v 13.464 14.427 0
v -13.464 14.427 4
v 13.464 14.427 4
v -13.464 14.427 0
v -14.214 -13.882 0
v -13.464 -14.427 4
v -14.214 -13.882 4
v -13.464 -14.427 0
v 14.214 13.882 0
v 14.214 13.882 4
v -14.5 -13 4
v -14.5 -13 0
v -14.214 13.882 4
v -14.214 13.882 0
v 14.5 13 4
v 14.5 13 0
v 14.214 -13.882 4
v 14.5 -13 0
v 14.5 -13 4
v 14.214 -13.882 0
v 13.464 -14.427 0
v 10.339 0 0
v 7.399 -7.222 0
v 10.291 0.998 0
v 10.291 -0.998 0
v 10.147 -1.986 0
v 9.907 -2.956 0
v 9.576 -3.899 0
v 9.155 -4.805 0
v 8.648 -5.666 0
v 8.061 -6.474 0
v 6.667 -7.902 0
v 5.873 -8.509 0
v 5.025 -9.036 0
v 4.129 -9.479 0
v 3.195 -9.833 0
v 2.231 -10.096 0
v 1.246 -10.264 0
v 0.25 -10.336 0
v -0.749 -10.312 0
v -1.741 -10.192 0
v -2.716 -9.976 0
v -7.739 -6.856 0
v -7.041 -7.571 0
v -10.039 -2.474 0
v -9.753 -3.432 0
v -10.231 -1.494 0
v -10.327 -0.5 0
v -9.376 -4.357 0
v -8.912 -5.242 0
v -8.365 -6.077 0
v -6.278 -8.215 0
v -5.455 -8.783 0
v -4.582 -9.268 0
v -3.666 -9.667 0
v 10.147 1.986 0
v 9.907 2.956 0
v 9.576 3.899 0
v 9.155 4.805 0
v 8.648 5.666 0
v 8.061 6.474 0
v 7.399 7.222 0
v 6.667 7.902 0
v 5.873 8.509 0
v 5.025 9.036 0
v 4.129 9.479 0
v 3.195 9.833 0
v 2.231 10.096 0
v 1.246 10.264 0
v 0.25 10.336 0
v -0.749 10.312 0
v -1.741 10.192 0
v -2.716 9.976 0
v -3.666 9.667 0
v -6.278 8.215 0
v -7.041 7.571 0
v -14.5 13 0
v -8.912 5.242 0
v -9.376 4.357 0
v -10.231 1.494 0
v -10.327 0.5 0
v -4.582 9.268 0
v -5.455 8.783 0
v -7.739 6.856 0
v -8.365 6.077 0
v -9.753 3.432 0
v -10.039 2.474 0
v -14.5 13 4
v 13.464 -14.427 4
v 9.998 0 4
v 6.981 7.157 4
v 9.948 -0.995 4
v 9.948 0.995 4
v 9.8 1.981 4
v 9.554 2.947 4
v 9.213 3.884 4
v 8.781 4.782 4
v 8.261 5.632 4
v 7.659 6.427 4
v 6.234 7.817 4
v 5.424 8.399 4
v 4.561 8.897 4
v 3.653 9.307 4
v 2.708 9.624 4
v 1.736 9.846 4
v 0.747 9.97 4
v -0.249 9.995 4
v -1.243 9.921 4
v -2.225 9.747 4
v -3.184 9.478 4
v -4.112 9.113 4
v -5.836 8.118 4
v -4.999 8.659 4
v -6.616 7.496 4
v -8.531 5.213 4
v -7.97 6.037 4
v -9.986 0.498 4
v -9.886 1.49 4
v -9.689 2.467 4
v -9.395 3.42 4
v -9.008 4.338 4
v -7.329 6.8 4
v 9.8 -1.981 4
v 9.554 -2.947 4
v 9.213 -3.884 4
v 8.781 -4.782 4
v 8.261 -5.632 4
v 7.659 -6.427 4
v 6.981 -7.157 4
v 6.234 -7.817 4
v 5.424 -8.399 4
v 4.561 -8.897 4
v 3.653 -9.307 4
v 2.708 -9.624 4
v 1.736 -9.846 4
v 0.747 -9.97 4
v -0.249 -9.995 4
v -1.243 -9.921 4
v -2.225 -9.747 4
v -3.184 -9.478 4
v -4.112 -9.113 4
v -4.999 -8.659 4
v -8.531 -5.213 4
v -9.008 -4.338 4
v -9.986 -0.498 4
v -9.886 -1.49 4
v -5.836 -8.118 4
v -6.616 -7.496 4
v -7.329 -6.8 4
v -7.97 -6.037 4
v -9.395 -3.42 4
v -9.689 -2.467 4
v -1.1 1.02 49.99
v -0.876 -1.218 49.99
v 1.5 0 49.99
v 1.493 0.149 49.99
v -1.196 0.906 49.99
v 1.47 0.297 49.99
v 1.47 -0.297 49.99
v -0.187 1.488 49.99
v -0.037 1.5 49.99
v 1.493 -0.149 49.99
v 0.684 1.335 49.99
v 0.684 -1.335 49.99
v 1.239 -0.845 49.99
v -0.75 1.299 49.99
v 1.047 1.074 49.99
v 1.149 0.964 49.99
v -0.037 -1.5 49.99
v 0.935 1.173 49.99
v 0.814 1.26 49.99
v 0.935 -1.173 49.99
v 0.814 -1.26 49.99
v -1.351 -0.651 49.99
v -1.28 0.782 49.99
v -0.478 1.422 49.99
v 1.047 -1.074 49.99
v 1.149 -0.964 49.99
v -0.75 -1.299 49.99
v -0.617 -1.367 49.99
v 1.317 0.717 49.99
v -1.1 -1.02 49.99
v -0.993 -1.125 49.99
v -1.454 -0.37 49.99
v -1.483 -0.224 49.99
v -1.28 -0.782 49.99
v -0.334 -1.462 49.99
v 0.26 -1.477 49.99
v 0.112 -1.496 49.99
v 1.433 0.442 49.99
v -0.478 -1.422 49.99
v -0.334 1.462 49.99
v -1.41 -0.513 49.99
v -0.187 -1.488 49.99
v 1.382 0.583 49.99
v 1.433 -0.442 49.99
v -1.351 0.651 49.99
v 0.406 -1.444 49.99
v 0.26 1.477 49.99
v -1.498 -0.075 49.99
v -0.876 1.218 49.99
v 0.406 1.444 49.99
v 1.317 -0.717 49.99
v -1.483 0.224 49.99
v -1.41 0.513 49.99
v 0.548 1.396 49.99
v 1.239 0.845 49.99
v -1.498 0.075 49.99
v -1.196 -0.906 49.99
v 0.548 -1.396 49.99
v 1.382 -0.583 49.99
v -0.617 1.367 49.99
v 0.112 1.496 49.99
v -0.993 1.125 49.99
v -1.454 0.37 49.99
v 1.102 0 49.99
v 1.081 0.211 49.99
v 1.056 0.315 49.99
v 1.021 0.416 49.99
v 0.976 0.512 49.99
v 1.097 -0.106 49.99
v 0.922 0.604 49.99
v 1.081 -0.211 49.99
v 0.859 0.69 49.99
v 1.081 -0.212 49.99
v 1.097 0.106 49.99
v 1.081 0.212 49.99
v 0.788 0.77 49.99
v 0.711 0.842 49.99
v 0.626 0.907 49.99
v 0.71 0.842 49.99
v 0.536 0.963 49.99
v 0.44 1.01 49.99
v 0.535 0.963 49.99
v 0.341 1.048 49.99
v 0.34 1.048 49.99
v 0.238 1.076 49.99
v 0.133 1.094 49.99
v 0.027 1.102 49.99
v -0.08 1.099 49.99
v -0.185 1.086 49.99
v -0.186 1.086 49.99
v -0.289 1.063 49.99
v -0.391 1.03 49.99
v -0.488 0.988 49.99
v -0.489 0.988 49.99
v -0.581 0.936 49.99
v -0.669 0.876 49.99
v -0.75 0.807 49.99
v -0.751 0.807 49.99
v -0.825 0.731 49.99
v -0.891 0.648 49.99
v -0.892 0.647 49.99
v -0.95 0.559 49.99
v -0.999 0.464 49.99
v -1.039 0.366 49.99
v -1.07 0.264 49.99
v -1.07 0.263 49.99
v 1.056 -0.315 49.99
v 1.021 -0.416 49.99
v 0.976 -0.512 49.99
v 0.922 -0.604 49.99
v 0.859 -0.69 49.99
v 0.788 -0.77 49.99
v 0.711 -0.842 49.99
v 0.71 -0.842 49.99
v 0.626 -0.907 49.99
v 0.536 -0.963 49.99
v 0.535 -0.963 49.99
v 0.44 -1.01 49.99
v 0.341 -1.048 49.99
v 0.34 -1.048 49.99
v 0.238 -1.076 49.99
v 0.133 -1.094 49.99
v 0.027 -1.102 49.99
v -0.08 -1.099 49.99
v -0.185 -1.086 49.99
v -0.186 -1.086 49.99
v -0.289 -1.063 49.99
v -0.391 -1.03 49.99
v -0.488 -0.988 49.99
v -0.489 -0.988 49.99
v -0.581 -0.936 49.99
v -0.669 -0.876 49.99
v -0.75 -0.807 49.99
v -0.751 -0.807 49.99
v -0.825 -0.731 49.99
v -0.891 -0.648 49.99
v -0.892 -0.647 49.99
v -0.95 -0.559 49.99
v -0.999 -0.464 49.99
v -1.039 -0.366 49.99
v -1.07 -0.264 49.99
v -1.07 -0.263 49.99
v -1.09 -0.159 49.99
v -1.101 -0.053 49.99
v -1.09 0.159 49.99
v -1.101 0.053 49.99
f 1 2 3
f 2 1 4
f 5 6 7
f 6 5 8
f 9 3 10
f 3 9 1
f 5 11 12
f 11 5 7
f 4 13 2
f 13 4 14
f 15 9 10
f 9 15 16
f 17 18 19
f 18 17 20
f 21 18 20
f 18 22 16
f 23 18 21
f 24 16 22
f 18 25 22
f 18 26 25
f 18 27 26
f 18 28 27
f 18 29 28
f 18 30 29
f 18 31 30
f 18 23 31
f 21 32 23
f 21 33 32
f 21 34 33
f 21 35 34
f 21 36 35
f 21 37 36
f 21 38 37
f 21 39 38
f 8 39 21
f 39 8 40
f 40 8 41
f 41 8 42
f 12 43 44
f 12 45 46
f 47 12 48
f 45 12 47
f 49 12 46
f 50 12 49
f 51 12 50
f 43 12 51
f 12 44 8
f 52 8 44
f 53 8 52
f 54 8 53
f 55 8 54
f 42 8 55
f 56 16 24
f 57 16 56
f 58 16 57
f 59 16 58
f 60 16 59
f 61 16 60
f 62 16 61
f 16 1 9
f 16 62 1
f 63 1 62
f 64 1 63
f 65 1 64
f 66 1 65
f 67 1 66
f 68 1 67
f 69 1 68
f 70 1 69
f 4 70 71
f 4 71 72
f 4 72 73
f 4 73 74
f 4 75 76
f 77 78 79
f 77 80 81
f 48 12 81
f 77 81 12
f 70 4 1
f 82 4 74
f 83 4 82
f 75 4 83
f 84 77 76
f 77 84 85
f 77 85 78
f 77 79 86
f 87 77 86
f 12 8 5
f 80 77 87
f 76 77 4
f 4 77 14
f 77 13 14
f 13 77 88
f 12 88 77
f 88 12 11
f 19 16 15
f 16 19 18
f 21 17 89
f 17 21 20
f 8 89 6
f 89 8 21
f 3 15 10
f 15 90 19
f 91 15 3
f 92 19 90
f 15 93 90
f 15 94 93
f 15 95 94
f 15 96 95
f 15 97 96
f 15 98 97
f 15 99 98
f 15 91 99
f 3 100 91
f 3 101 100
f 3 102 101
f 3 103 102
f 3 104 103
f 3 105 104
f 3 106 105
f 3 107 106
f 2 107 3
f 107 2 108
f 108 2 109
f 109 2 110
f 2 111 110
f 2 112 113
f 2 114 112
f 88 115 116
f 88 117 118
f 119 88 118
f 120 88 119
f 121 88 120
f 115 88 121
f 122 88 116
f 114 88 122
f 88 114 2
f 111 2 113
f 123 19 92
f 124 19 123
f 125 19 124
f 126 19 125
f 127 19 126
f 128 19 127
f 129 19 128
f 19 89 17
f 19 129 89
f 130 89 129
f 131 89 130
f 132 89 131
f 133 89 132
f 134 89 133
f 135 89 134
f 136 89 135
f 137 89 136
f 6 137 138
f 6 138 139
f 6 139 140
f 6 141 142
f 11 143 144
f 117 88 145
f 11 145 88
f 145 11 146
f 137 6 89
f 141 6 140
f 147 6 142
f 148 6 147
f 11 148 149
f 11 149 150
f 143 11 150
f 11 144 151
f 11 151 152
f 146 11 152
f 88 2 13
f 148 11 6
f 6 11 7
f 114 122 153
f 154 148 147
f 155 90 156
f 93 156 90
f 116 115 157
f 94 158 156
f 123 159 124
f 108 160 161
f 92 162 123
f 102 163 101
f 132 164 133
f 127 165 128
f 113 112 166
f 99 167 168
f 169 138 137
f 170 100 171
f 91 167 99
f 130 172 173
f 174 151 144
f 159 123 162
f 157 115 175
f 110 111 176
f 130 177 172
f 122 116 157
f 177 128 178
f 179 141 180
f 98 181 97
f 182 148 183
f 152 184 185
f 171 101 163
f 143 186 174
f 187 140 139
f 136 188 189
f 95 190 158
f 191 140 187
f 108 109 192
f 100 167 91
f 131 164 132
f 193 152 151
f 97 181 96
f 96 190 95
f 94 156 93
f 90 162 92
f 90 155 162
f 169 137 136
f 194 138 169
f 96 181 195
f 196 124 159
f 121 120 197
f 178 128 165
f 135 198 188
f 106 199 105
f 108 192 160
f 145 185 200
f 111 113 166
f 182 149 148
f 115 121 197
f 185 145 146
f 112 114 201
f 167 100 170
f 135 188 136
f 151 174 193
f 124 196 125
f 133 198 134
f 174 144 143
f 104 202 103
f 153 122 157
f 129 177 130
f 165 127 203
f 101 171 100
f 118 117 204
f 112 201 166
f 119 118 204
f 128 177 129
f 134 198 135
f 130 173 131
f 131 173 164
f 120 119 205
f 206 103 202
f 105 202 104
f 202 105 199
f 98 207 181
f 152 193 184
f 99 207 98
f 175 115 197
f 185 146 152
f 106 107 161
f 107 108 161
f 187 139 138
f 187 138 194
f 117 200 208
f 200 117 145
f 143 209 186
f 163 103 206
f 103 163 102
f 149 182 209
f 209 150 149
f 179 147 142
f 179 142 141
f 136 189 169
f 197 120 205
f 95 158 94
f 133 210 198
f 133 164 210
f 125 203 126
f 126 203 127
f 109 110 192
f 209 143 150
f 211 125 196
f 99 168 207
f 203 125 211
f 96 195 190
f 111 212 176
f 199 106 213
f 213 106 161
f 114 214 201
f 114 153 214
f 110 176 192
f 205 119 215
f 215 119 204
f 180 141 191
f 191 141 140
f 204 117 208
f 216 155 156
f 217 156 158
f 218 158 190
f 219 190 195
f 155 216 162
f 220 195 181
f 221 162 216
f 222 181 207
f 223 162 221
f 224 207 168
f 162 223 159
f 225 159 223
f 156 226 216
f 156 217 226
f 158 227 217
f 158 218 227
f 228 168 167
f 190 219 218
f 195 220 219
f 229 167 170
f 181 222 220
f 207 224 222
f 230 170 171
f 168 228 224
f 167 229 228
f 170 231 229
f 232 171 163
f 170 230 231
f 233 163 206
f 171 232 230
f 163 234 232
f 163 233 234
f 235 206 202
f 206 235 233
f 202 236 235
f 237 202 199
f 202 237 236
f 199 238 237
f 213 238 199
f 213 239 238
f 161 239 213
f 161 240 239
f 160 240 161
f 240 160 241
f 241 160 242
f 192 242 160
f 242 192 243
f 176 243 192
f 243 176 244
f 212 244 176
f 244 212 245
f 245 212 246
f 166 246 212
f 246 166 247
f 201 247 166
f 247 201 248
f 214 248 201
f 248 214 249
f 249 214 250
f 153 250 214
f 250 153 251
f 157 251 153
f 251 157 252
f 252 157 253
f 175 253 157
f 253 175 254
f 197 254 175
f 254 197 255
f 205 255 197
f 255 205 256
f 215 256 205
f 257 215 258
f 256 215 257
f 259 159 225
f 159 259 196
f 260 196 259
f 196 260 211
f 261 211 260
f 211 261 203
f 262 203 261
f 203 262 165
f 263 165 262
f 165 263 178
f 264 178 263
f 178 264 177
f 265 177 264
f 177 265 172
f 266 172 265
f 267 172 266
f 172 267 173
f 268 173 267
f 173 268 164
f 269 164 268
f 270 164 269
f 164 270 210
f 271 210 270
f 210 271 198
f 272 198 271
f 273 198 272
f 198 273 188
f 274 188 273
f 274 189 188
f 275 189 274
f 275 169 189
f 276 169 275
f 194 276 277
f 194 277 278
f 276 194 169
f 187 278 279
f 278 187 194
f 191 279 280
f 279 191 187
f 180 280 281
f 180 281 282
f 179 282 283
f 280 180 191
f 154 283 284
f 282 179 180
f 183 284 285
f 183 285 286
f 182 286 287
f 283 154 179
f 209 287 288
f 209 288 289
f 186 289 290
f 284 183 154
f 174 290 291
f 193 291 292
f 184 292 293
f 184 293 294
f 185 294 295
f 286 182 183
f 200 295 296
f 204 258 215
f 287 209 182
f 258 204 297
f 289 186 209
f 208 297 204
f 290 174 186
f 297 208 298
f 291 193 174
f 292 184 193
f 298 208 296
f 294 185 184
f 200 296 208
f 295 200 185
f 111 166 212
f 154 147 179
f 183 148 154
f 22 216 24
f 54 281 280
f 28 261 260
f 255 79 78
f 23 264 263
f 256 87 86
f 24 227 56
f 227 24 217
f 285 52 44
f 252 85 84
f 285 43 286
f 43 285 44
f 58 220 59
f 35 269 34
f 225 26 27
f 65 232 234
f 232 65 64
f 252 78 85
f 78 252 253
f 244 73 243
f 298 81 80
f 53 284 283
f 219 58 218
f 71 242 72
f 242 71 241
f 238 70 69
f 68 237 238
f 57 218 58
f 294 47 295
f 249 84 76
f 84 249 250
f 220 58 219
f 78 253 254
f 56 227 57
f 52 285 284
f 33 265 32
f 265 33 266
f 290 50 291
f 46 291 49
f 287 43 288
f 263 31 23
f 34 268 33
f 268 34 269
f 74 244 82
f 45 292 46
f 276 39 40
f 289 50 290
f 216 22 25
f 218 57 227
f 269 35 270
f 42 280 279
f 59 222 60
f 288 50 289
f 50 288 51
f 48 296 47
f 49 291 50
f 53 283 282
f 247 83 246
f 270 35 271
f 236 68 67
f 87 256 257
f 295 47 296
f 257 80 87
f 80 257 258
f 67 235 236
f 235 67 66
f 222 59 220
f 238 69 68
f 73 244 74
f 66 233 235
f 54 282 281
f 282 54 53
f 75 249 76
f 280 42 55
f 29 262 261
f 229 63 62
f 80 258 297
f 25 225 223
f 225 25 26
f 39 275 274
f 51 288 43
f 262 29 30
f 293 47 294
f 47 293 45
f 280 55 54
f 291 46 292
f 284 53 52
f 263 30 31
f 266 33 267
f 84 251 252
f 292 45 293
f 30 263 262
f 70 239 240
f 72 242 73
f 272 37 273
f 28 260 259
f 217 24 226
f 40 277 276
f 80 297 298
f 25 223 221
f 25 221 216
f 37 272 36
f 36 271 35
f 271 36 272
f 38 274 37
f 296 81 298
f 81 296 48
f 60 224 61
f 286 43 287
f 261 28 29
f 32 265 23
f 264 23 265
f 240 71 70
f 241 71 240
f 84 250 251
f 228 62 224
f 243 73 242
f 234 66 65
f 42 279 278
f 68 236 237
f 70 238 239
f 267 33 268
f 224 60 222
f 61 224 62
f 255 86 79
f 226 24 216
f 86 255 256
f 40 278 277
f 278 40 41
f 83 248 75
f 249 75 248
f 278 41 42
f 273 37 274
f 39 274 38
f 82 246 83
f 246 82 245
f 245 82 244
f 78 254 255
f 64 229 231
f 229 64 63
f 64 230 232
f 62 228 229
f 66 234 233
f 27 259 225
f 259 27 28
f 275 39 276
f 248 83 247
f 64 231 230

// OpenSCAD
// -*- mode: SCAD ; c-file-style: "ellemtel" ; coding: utf-8 -*-
//
// 50 cm Leitkegel im Maßstab 1:10
//
// © 2018–2019 Roland Sieker <ospalh@gmail.com>
// Licence: CC-BY-SA 4.0

/* [Global] */

// Set this to “render” and click on “Create Thing” when done with the setup.
preview = 1; // [0:render, 1:preview]

/* [Sizs] */

// Hight
hight = 50;  // [15:1:100]

// Diameter of the cone at the base
d_cb = 20;  // [5:0.5:40]

// Diameter of the cone at the top
d_ct = 3;  // [0.4:0.1:4]

// Width of the base
w_b = 29;    // [8:0.5:50]

// Hight of the base
h_b = 4; // [0.4:0.1:10]

/* [Hidden] */

// Done with the customizer

// *******************************************************
// Extra parameters. These can be changed reasonably safely.


// w = 0.8;  // Wall width
w = 0.4;  // Wall width
r_bc = d_ct/2;



// *******************************************************
// Some shortcuts. These shouldn’t be changed

tau = 2 * PI;  // π is still wrong. τ = circumference / r

xy_b = w_b / 2 - r_bc;
hc = hight - h_b;

ms = 0.01;  // Muggeseggele.

// fn for differently sizd objects and fs, fa; all for preview or rendering.
pna = 40;
pnb = 15;
pa = 5;
ps = 1;
rna = 180;
rnb = 30;
ra = 1;
rs = 0.1;
function na() = (preview) ? pna : rna;
function nb() = (preview) ? pnb : rnb;
$fs = (preview) ? ps : rs;
$fa = (preview) ? pa : ra;

// *******************************************************
// End setup



// *******************************************************
// Generate the parts

cone();
echo_hights();


// *******************************************************
// Code for the parts themselves

module cone()
{
   difference()
   {
      union()
      {
         base();
         solid_cone();
      }
      stack_hole();
   }
}

module base()
{
   linear_extrude(h_b)
   {
      2d_base();
   }
}

module 2d_base()
{
   hull()
   {
      one_bc(1,1);
      one_bc(1,-1);
      one_bc(-1,-1);
      one_bc(-1,1);
   }
}

module one_bc(xs, ys)
{
   translate([xs*xy_b, ys*xy_b])
   {
      circle(r_bc);
   }
}

module solid_cone()
{
   translate([0,0,h_b-ms])
   {
      cylinder(d1=d_cb, d2=d_ct, h=hc);
   }
}

module stack_hole()
{
   d_bb = ((hight+ms)/hc) * (d_cb-d_ct) + d_ct;
   echo(d_bb);
   translate([0,0,-ms])
   {
      cylinder(d1=d_bb-2*w, d2=d_ct-2*w, h=hight+ms);
   }
}


module echo_hights()
{
   sw = hc/5;
   echo("orange→white at ", h_b + sw);
   echo("white→orange at ", h_b + 2 * sw);
   echo("orange→white at ", h_b + 3 * sw);
   echo("white→orange at ", h_b + 4 * sw);
}
